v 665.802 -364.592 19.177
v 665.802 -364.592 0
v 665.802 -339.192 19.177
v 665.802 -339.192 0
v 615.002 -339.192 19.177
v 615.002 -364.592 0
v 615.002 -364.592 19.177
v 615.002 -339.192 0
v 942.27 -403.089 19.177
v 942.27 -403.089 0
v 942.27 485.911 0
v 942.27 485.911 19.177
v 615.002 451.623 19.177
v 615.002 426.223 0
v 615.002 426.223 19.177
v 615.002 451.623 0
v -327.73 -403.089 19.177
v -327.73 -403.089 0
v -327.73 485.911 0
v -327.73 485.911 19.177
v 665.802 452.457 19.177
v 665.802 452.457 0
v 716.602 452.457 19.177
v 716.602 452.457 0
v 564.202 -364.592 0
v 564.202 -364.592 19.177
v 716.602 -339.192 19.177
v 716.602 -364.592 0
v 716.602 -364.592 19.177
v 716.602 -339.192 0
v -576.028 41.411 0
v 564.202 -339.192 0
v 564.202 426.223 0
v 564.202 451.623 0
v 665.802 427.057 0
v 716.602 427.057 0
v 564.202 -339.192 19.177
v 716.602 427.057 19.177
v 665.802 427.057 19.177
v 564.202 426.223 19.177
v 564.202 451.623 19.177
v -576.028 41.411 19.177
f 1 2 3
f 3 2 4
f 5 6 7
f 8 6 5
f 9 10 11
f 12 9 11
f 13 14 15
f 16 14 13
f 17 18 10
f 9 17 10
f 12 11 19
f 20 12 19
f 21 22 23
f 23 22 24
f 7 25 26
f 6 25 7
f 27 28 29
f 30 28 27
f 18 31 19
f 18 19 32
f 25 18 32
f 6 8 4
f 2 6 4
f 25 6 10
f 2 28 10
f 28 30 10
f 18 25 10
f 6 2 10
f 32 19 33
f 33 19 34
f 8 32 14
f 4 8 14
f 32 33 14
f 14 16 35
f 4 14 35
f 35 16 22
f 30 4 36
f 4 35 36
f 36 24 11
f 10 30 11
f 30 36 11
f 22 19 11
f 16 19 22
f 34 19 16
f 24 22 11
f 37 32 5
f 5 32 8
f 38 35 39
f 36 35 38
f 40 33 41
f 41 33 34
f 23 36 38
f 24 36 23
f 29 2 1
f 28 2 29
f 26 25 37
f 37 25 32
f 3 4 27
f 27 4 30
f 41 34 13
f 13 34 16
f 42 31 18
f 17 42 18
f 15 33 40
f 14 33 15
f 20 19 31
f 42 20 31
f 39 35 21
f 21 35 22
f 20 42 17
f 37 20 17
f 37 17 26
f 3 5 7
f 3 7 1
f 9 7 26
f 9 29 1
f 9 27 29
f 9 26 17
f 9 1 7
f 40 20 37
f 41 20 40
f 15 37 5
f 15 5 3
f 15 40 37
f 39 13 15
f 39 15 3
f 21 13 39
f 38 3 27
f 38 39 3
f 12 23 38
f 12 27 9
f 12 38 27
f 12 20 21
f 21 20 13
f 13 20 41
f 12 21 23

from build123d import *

# Parameters (mm, degrees)
F0_W     = 50.8
F0_H     = 25.4
F1_DEPTH = 19.177


with BuildPart() as f1:
    # F0 (on Top) → F1 (new body)
    with BuildSketch(Plane.XY):
        Polygon((942.269583, 485.910804), (-327.730417, 485.910804), (-576.028023, 41.410804), (-327.730417, -403.089196), (942.269583, -403.089196), align=None)
        with Locations((589.601648, -351.892287)):
            Rectangle(F0_W, F0_H, mode=Mode.SUBTRACT)
        with Locations((691.201648, -351.892287)):
            Rectangle(F0_W, F0_H, mode=Mode.SUBTRACT)
        with Locations((589.601648, 438.922962)):
            Rectangle(F0_W, F0_H, mode=Mode.SUBTRACT)
        with Locations((691.201648, 439.756531)):
            Rectangle(F0_W, F0_H, mode=Mode.SUBTRACT)
    extrude(amount=F1_DEPTH)


solid = f1.part
